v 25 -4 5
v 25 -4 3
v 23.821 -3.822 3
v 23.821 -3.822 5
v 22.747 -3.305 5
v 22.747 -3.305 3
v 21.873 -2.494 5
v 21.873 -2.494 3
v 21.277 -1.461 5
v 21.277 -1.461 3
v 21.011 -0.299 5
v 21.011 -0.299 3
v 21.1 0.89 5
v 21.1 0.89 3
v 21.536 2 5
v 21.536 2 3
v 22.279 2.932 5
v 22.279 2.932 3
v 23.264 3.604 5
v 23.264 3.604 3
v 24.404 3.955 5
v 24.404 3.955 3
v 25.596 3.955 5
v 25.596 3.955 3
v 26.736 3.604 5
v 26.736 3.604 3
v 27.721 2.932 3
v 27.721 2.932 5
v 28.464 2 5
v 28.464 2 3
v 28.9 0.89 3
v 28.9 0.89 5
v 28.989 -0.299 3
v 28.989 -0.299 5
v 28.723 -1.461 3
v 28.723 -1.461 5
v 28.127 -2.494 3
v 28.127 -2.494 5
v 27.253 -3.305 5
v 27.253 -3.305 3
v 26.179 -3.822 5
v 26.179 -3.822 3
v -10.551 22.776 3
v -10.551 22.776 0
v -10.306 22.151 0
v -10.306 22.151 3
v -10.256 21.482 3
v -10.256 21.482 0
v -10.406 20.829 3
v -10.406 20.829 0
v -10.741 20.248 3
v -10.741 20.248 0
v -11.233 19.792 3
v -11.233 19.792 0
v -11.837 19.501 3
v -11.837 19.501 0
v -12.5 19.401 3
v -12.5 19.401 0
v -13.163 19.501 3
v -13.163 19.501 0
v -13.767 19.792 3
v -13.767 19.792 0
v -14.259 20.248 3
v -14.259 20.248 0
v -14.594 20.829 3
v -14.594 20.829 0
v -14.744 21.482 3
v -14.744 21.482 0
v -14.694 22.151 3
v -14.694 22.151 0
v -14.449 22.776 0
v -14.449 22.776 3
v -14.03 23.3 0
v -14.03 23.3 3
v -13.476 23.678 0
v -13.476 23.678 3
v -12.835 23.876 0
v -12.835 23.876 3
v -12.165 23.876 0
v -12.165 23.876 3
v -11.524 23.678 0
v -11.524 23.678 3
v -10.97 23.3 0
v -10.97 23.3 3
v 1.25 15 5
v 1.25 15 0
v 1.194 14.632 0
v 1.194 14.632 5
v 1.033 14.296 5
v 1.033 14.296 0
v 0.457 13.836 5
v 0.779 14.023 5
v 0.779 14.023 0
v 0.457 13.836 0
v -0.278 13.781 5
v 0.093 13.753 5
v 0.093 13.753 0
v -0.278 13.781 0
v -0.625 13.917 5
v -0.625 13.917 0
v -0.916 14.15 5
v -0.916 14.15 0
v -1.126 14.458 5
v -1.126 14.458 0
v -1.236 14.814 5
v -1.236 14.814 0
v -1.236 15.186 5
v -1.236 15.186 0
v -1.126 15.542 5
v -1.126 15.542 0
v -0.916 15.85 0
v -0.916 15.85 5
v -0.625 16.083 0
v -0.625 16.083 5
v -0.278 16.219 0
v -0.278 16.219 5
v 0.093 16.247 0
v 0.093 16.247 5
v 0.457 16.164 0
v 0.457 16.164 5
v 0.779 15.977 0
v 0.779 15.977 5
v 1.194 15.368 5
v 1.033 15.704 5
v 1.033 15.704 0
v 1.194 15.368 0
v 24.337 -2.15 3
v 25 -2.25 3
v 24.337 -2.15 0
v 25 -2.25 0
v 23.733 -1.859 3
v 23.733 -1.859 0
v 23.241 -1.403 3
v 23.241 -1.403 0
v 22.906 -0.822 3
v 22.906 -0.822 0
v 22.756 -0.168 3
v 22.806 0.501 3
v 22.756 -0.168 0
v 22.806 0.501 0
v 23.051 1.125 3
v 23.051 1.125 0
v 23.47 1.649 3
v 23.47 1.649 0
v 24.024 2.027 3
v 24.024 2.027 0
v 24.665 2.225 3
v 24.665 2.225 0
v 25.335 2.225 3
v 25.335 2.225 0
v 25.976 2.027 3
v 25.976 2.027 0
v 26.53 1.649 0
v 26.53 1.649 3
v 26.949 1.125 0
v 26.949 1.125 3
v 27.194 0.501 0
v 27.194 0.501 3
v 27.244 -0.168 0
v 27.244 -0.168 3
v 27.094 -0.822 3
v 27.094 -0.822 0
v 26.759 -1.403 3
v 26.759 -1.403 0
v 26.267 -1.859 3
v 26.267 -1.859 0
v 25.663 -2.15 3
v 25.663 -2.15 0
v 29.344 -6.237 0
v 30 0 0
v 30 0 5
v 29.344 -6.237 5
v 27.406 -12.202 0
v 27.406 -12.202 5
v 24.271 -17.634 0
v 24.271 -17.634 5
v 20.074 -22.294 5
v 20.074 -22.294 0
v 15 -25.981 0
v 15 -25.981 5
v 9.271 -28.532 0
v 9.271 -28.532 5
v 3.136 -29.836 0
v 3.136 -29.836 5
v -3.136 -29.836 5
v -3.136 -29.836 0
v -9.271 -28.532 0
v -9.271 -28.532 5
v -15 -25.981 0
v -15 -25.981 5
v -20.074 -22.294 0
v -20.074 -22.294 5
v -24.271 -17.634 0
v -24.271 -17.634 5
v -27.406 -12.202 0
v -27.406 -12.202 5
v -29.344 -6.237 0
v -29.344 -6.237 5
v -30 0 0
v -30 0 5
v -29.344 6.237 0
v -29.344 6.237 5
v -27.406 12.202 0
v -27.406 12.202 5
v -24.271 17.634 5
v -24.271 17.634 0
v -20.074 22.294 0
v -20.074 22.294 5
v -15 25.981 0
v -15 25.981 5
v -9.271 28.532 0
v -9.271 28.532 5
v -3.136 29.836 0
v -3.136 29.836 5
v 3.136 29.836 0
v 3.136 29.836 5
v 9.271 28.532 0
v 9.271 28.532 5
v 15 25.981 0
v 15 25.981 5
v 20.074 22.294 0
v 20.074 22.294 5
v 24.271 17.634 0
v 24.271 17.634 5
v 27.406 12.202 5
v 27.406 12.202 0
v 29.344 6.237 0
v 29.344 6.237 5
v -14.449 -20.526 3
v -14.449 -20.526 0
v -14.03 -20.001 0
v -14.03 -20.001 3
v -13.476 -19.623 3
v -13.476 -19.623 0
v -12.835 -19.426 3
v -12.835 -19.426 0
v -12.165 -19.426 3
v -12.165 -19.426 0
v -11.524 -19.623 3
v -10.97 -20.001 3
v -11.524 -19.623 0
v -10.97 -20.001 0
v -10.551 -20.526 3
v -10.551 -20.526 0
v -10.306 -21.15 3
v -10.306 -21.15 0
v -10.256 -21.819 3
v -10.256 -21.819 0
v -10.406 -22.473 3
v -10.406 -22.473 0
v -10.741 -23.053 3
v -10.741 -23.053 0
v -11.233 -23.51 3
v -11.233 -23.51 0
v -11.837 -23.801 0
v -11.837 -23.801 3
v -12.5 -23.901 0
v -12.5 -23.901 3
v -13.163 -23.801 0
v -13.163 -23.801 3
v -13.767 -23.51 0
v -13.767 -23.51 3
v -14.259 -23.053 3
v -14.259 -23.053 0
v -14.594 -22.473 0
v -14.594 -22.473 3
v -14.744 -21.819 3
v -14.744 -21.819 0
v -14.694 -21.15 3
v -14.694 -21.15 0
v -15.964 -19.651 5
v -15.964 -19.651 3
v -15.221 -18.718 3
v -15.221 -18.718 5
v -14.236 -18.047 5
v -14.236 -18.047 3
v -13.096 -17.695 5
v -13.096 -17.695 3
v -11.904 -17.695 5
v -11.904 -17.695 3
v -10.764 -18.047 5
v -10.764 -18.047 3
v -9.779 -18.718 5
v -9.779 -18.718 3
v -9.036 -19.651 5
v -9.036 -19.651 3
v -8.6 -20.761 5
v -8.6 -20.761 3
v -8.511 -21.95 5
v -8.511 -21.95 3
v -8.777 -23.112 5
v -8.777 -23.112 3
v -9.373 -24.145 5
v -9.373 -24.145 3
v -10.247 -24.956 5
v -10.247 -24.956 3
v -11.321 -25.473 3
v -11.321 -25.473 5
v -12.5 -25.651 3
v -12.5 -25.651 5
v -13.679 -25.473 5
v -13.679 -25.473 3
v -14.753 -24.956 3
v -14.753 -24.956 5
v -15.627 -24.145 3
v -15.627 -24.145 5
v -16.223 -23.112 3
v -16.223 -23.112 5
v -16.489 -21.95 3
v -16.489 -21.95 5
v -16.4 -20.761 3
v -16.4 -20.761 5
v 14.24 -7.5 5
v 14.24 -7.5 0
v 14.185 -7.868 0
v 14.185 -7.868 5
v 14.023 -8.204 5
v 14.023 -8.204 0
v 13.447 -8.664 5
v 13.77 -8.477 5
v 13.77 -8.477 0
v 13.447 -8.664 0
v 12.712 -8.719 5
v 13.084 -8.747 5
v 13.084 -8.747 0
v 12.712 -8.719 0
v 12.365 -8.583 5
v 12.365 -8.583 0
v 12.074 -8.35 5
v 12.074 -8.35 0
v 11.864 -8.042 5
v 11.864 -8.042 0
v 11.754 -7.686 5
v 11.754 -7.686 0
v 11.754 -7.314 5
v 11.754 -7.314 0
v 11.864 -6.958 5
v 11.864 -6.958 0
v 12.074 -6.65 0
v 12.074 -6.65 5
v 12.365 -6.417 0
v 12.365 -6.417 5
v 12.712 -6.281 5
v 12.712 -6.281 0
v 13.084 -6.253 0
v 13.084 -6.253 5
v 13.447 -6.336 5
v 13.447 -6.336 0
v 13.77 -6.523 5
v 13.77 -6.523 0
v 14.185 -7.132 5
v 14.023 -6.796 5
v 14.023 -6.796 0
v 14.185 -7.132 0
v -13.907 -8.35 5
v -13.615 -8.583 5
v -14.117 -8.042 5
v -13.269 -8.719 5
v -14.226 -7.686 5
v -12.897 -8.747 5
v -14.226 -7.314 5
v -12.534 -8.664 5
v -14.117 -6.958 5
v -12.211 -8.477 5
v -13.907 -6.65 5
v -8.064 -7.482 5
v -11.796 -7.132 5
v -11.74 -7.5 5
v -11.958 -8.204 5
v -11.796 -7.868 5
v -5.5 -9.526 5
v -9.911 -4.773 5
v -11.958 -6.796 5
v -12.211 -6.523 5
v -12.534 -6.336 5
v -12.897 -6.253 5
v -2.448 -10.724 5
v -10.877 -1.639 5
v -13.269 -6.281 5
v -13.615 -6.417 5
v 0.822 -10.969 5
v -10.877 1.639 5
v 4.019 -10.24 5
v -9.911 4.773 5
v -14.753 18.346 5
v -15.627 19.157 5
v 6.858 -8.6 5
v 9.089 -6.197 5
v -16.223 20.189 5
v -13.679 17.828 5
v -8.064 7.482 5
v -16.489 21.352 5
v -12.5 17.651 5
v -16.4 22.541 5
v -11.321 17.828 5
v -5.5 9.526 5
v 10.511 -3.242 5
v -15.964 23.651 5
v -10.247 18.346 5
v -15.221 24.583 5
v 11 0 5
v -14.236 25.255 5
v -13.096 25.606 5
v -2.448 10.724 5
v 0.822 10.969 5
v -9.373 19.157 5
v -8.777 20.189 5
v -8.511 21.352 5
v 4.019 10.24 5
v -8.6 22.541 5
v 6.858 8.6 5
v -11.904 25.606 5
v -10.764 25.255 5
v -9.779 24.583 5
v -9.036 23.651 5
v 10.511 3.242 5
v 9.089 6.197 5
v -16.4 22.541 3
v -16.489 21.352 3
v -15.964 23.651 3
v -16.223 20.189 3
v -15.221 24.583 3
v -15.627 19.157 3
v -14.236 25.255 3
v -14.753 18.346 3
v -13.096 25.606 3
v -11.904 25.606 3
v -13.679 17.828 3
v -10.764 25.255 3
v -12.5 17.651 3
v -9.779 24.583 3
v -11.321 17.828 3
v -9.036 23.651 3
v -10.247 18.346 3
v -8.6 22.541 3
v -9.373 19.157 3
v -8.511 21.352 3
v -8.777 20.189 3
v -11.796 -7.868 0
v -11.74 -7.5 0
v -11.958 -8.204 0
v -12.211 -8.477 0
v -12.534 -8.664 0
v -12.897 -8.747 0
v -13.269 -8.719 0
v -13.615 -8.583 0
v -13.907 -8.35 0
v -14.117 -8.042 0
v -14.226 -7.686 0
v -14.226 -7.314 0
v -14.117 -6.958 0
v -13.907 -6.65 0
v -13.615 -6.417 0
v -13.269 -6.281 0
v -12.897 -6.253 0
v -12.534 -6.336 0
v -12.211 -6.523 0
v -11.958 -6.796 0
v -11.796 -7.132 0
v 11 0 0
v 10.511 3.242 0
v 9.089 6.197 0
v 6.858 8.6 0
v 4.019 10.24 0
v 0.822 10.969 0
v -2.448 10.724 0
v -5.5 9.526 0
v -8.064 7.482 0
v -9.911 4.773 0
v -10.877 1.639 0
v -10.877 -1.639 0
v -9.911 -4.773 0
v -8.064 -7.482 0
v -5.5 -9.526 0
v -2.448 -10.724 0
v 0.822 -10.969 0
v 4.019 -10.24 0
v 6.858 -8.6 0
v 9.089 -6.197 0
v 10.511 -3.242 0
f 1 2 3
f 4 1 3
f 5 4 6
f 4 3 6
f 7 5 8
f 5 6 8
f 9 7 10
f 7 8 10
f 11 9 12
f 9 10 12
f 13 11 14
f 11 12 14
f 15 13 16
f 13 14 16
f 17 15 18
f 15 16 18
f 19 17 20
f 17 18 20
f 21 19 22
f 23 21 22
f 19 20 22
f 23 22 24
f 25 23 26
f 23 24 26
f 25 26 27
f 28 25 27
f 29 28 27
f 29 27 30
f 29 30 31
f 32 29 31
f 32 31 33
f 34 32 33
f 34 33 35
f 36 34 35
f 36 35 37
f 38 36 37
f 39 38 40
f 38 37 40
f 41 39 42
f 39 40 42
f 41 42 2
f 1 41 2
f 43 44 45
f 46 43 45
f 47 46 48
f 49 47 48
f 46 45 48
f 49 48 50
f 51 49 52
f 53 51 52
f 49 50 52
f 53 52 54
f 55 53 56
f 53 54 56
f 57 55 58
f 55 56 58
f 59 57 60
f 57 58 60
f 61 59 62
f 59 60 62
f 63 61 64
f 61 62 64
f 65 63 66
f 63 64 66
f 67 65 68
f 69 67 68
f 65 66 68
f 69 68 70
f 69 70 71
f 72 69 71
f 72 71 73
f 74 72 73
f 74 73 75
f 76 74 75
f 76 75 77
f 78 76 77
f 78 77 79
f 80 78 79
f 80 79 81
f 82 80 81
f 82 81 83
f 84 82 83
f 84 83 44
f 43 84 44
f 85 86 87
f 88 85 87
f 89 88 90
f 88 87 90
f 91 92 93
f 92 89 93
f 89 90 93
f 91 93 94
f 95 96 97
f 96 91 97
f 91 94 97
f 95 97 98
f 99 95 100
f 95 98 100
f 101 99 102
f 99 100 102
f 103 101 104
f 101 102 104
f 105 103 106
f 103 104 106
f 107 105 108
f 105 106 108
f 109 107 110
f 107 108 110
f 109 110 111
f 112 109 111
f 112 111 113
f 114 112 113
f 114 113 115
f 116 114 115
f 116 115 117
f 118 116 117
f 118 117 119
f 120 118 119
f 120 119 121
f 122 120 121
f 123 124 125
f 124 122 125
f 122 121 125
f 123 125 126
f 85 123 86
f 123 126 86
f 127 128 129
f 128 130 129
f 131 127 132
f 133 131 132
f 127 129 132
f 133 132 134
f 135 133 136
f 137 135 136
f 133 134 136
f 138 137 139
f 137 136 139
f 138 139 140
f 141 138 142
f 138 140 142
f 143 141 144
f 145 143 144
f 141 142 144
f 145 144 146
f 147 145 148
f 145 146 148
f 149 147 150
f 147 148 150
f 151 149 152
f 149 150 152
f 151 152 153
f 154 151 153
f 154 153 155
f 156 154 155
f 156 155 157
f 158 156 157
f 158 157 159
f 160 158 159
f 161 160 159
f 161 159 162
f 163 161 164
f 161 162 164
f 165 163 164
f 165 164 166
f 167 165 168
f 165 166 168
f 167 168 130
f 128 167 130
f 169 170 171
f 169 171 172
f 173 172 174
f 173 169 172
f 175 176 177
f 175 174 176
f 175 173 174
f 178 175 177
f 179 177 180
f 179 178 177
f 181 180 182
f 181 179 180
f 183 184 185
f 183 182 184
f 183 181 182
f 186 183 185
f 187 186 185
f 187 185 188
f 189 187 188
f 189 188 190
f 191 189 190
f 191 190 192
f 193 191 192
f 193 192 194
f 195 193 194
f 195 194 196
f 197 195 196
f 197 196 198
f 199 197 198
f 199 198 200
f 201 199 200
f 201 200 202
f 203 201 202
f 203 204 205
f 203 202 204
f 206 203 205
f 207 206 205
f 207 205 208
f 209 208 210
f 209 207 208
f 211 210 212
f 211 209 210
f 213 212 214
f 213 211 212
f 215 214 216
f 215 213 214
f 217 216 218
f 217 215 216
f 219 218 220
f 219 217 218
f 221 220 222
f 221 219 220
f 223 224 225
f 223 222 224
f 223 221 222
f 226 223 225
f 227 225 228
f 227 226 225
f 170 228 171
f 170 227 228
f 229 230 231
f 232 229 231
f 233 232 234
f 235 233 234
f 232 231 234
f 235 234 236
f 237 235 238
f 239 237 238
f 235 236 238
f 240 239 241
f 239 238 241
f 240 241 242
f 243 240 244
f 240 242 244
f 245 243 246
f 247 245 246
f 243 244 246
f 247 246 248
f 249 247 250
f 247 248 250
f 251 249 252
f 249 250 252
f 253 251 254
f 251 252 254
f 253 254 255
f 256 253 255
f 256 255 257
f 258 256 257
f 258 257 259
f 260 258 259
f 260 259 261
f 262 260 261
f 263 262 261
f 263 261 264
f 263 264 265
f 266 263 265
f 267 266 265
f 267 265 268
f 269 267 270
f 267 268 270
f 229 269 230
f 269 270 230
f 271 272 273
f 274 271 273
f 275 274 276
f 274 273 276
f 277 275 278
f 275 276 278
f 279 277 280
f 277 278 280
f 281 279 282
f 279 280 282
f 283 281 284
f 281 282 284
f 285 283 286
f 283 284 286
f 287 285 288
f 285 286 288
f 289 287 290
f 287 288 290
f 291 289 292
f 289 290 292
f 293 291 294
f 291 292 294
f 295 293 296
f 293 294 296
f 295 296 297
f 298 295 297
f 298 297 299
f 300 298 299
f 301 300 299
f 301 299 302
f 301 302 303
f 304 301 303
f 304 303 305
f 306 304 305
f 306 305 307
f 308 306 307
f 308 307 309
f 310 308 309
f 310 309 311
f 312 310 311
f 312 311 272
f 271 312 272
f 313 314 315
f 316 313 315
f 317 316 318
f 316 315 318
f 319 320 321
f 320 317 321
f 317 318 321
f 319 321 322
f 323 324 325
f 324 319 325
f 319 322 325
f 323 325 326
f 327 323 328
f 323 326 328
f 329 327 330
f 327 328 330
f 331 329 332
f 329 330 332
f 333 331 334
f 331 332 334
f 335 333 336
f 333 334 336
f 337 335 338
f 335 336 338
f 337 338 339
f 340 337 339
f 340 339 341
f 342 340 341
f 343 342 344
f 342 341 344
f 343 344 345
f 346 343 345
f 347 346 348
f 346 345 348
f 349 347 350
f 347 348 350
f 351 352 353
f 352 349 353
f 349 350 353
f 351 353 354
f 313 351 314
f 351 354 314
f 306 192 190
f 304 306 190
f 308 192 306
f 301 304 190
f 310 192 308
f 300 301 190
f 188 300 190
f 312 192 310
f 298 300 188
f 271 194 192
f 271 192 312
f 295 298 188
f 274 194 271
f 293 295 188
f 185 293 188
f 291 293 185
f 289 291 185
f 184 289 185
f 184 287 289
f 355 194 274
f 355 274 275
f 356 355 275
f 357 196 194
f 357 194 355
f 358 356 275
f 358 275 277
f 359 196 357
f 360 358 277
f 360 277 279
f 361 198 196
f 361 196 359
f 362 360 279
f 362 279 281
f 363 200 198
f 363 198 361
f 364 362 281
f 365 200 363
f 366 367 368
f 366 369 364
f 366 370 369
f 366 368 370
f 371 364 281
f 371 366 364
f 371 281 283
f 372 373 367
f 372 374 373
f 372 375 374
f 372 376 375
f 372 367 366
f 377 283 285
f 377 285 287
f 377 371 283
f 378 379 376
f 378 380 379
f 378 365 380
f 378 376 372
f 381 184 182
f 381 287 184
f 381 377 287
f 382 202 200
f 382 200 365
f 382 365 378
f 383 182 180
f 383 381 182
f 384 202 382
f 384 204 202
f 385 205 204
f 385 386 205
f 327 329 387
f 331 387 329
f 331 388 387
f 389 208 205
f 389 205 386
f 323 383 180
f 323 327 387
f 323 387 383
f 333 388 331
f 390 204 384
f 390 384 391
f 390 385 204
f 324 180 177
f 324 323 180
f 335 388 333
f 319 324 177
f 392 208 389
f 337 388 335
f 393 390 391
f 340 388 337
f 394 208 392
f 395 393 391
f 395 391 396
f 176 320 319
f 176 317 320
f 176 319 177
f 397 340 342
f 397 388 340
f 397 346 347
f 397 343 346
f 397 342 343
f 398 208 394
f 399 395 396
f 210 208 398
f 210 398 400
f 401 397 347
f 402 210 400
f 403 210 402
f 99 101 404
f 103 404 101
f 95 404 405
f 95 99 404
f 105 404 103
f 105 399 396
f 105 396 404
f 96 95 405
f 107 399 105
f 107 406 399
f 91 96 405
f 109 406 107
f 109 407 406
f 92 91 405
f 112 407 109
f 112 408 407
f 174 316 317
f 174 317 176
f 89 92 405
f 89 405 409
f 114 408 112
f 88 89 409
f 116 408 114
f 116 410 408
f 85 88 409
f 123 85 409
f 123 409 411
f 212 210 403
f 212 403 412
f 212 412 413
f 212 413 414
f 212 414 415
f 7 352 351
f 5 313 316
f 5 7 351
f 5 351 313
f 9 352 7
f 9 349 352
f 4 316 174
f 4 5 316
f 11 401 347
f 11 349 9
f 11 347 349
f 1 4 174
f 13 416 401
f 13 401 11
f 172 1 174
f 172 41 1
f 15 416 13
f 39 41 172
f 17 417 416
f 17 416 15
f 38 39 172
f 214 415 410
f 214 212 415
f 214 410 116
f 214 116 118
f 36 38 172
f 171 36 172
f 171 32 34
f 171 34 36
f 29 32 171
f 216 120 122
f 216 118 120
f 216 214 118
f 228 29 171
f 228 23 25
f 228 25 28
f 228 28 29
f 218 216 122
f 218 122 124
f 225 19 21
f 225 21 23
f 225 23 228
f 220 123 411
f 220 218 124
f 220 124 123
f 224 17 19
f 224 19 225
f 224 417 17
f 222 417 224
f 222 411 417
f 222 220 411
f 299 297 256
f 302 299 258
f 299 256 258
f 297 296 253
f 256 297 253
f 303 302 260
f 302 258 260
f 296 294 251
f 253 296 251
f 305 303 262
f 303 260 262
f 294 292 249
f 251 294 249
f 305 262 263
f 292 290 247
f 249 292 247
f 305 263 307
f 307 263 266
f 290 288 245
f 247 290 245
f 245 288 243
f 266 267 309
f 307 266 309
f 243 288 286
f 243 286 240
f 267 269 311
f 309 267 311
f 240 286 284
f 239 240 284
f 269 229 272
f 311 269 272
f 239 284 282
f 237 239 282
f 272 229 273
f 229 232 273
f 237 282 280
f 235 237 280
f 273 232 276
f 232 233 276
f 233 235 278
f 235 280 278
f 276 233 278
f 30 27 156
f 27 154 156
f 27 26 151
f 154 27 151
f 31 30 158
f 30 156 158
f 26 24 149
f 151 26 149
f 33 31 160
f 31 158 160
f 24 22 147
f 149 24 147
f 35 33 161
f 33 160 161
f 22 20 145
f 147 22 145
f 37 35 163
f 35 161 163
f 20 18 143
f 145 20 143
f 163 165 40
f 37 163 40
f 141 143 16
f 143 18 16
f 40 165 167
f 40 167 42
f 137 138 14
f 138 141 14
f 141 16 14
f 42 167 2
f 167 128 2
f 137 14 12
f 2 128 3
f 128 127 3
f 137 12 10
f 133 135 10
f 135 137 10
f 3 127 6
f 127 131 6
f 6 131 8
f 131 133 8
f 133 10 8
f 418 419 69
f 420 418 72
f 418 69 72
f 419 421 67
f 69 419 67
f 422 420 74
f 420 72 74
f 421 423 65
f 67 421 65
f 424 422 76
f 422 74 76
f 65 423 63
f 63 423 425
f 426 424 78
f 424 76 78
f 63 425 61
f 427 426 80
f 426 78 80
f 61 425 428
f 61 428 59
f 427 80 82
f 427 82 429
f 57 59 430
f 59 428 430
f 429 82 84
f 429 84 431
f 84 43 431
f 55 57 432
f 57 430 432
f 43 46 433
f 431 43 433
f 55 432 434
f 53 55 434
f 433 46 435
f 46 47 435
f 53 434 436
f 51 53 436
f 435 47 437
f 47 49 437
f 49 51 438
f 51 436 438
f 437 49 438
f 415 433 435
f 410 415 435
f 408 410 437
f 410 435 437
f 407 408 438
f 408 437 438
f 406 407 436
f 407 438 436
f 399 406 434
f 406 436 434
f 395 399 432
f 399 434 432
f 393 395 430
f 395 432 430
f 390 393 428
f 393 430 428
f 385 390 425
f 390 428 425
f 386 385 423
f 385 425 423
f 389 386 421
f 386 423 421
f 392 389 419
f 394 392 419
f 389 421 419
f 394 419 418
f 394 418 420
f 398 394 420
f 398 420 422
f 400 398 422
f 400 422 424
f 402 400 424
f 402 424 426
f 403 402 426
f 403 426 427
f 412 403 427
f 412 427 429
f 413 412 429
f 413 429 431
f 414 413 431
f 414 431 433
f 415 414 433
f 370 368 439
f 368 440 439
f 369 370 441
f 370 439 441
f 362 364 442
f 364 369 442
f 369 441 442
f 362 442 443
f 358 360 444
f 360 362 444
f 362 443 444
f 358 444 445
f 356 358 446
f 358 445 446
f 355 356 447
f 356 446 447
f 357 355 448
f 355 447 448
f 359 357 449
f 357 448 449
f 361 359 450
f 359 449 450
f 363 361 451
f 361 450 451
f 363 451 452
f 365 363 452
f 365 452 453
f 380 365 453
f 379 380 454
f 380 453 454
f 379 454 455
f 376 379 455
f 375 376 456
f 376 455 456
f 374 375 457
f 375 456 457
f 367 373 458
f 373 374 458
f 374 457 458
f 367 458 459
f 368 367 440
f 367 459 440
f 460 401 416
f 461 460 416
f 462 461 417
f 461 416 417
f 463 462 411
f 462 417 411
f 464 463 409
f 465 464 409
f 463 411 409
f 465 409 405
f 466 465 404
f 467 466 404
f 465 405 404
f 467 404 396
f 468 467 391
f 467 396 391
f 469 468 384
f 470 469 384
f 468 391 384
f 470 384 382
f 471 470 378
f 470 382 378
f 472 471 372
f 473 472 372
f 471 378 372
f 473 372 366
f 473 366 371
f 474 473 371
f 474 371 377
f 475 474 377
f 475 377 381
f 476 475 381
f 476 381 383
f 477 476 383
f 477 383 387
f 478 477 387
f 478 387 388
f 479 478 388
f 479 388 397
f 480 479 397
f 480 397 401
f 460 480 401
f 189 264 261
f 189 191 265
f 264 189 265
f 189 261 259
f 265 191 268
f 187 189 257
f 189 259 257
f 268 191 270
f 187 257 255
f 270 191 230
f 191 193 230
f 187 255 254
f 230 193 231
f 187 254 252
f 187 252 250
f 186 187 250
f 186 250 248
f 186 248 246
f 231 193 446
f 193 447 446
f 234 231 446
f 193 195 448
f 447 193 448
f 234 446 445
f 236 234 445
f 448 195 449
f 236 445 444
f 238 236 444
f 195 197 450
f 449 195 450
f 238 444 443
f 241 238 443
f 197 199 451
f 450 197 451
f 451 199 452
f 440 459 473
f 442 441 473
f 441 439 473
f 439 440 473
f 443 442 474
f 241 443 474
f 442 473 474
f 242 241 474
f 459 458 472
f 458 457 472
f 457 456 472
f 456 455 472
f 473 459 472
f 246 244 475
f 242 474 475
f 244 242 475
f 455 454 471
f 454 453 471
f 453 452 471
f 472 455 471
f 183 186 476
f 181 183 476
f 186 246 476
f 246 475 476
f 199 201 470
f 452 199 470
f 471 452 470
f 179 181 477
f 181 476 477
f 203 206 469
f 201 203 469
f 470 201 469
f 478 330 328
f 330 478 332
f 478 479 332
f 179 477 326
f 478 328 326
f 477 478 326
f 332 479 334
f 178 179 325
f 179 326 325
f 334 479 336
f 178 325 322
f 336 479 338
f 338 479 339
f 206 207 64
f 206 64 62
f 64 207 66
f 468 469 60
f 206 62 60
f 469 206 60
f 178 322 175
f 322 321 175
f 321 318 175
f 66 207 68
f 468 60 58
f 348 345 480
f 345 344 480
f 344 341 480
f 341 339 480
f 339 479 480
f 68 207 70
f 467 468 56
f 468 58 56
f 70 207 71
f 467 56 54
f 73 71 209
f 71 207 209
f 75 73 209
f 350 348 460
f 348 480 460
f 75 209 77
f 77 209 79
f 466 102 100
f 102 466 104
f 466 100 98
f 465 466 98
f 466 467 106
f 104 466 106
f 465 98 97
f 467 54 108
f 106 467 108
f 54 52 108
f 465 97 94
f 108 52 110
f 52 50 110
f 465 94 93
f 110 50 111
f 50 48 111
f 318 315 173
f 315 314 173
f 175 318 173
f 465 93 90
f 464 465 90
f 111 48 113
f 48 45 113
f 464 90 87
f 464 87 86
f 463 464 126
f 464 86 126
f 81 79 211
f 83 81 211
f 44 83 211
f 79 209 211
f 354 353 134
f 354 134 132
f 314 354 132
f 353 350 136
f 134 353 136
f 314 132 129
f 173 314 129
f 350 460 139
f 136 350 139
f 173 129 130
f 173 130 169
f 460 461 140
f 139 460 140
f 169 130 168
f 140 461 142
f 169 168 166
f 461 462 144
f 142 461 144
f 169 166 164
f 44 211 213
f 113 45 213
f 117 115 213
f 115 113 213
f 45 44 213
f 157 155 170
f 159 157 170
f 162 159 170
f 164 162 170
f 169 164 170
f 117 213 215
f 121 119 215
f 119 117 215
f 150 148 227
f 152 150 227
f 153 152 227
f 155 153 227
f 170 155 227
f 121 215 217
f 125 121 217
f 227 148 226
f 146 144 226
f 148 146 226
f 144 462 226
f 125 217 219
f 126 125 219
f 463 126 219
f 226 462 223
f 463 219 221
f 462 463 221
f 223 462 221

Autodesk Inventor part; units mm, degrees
ref_plane "YZ Plane" through (0, 0, 0) normal (1, 0, 0) x (0, 1, 0)
ref_plane "XZ Plane" through (0, 0, 0) normal (0, 1, 0) x (-1, 0, 0)
ref_plane "XY Plane" through (0, 0, 0) normal (0, 0, 1) x (1, 0, 0)
sketch "Sketch1" plane through (0, 0, 0) normal (0, 0, 1) x (1, 0, 0)
  circle A0 centre (0, 0) radius 10
  circle A1 centre (0, 0) radius 30
  circle A2 centre (0, 15) radius 1.25
  circle A3 centre (-12.9904, -7.5) radius 1.25
  circle A4 centre (12.9904, -7.5) radius 1.25
  dimension "d0" = 20
  dimension "d1" = 60
  dimension "d3" = 2.5
  dimension "d6" = 360
extrude "Extrusion1" add sketch "Sketch1" along normal blind 5
sketch "Sketch5" plane through (0, 0, 5) normal (0, 0, 1) x (1, 0, 0)
  circle A0 centre (0, 0) radius 25 construction
  circle A1 centre (25, 0) radius 2.25
  dimension "d40" = 50
  dimension "d41" = 4.5
hole "Hole1" at (25, 0, 5) direction (0, 0, -1) diameter 4.5 end through all counterbore diameter 8 counterbore depth 2
pattern_circular "Circular Pattern2" count 3 over 360 about axis through (0, 0, 0) along (0, 0, 1) of "Hole1"
sketch "Sketch4" plane through (0, 0, 5) normal (0, 0, 1) x (1, 0, 0)
  circle A0 centre (0, 0) radius 10 projected
  circle A1 centre (0, 0) radius 11
  dimension "d34" = 1
extrude "Extrusion8" cut sketch "Sketch4" against normal blind 10
properties part number "Encoder Mount Front" material "ABS Plastic"
